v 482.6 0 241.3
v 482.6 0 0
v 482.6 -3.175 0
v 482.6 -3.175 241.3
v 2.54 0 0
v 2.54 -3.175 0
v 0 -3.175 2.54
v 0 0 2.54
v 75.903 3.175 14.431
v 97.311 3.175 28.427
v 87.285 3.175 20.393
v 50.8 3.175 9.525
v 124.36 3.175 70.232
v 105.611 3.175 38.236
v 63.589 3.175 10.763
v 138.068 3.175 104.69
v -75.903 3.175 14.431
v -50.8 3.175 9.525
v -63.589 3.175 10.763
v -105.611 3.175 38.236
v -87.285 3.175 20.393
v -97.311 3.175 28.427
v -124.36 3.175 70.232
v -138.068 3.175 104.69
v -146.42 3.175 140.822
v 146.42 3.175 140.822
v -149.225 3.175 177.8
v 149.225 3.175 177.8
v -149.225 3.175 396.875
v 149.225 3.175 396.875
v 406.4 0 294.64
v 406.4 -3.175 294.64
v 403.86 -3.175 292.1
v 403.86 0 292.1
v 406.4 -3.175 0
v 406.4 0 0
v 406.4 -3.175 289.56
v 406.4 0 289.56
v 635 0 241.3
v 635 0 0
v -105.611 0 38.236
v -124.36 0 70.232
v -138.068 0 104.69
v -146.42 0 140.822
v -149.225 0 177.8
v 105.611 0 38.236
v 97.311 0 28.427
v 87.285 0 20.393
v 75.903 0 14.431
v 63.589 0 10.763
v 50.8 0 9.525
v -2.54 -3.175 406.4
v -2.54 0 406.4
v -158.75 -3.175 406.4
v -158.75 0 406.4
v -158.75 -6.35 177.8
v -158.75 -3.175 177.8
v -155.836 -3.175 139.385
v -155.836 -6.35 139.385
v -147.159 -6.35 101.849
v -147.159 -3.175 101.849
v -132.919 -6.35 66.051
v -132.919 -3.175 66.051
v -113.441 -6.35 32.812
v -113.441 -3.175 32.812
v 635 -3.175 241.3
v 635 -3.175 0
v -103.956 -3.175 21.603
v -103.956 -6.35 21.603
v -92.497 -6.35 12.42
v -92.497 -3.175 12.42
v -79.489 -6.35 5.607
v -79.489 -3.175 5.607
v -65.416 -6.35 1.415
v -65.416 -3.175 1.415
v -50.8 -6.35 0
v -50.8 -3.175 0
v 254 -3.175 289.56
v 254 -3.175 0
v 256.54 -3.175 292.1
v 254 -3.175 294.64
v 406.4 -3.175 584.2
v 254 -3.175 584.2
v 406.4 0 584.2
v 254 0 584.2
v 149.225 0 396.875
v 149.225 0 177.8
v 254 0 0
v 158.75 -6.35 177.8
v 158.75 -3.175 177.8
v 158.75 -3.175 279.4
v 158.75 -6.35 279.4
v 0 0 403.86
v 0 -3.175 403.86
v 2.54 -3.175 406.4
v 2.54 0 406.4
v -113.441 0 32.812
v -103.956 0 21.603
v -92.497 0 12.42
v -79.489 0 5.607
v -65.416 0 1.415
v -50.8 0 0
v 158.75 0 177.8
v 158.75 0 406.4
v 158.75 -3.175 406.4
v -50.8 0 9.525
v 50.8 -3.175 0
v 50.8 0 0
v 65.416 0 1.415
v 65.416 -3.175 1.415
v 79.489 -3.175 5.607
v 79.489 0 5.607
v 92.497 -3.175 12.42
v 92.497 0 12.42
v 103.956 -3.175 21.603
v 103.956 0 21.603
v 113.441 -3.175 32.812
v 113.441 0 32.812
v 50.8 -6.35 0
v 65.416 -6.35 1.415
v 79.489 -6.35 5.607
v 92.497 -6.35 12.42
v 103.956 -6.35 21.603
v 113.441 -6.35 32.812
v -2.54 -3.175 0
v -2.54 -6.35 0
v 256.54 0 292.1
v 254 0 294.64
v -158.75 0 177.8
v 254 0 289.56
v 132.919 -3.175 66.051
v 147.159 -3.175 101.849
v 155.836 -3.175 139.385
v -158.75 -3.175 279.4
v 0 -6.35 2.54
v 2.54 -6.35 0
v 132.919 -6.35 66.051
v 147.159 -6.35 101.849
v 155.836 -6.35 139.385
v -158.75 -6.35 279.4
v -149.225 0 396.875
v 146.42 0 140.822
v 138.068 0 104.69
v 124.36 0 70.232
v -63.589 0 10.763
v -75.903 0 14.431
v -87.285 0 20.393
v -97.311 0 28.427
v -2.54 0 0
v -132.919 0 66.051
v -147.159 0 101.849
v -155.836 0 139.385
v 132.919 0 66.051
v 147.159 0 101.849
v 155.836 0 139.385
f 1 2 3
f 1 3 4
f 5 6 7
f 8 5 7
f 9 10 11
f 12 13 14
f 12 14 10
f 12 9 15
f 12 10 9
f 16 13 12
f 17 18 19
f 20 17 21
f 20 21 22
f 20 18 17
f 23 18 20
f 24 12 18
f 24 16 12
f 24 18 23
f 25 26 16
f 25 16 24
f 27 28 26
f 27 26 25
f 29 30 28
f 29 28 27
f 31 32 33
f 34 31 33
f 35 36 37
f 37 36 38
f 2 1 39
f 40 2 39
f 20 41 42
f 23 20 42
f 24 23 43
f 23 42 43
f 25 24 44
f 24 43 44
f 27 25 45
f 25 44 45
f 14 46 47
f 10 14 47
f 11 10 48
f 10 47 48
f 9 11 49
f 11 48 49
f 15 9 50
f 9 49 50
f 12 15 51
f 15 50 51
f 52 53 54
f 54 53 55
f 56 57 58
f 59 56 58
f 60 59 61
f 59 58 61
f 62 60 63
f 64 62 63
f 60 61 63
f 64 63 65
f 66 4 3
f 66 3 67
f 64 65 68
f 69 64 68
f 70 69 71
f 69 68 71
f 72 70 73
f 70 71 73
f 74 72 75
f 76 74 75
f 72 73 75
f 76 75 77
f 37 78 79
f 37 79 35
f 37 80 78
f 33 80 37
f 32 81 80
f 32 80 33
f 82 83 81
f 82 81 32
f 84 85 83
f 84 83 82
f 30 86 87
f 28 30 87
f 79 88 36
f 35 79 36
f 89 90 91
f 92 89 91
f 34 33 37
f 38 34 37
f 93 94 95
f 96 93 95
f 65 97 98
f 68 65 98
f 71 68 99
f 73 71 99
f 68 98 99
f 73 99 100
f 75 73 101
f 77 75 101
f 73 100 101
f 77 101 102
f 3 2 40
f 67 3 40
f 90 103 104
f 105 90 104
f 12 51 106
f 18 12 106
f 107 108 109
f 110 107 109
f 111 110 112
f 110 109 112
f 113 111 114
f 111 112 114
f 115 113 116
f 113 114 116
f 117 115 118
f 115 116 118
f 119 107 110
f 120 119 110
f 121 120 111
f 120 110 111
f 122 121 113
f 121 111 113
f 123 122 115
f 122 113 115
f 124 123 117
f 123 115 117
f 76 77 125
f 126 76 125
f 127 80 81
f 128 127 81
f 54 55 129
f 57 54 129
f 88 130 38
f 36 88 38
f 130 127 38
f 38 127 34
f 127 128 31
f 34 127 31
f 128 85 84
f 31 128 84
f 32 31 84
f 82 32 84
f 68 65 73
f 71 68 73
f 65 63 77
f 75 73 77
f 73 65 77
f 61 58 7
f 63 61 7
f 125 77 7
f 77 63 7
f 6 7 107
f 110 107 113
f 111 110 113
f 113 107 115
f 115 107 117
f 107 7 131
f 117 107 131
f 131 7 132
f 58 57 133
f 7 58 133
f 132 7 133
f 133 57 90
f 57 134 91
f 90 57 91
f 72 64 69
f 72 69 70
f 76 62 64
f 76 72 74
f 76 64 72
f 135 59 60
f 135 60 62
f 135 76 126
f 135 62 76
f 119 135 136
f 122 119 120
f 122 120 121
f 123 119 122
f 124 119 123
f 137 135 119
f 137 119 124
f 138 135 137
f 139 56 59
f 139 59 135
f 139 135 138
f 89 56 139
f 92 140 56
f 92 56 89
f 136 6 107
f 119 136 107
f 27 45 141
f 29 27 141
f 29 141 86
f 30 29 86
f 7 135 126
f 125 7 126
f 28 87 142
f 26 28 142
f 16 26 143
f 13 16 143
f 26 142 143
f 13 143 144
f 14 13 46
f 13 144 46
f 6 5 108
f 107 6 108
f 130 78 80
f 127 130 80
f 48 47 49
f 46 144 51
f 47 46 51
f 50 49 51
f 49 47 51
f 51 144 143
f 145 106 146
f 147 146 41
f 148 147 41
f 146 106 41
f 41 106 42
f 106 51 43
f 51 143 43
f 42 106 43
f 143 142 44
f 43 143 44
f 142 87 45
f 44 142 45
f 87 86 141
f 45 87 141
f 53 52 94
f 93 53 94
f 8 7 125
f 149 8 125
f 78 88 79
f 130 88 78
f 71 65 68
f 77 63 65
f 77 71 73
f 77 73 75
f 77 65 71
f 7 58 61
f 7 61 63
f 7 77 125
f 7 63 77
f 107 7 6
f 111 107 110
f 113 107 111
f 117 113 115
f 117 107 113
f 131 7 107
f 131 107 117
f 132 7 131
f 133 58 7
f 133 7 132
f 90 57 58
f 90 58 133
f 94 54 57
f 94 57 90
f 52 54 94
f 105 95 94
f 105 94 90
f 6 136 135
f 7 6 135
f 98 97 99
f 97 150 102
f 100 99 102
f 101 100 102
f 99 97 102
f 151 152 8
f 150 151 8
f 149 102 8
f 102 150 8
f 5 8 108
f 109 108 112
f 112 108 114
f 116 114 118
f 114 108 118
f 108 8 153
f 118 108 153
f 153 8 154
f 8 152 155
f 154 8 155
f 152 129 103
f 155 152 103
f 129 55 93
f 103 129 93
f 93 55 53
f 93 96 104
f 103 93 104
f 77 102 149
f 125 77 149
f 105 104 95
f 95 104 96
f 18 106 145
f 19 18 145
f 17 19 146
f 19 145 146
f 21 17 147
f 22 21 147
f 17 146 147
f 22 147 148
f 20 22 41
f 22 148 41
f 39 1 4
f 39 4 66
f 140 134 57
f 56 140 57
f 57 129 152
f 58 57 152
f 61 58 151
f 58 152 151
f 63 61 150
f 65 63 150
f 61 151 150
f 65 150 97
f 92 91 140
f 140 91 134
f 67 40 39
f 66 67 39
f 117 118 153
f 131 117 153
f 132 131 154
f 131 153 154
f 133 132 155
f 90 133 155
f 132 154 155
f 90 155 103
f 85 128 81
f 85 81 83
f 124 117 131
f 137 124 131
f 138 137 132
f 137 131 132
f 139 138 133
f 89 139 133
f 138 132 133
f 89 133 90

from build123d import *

# Parameters (mm, degrees)
F1_DEPTH = 3.175
F3_DEPTH = 3.175
F5_DEPTH = 3.175
F6_W     = 152.4
F6_H     = 584.2
F6_H_2   = 241.3
F7_DEPTH = 3.175
F9_DEPTH = 25.4


with BuildPart() as f1:
    # F0 (on Front) → F1 (new body)
    with BuildSketch(Plane.XZ):
        with BuildLine():
            Line((158.75, 177.8), (158.75, 406.4))
            Line((158.75, 406.4), (-158.75, 406.4))
            Line((-158.75, 406.4), (-158.75, 177.8))
            ThreePointArc((-158.75, 177.8), (-147.159009, 101.848747), (-113.441281, 32.8121))
            ThreePointArc((-113.441281, 32.8121), (-86.157333, 8.699637), (-50.8, 0))
            Line((-50.8, 0), (0, 0))
            Line((0, 0), (50.8, 0))
            ThreePointArc((50.8, 0), (86.157333, 8.699637), (113.441281, 32.8121))
            ThreePointArc((113.441281, 32.8121), (147.159009, 101.848747), (158.75, 177.8))
        make_face()
    extrude(amount=F1_DEPTH)


with BuildPart() as f3:
    # F2 (on face) → F3 (new body)
    with BuildSketch(Plane.XZ.offset(3.175)):
        with BuildLine():
            Line((-158.75, 279.4), (-158.75, 177.8))
            ThreePointArc((-158.75, 177.8), (-147.159009, 101.848747), (-113.441281, 32.8121))
            ThreePointArc((-113.441281, 32.8121), (-86.157333, 8.699637), (-50.8, 0))
            Line((-50.8, 0), (50.8, 0))
            ThreePointArc((50.8, 0), (86.157333, 8.699637), (113.441281, 32.8121))
            ThreePointArc((113.441281, 32.8121), (147.159009, 101.848747), (158.75, 177.8))
            Line((158.75, 177.8), (158.75, 279.4))
            Line((158.75, 279.4), (-158.75, 279.4))
        make_face()
    extrude(amount=F3_DEPTH)


with BuildPart() as f5:
    # F4 (on face) → F5 (new body)
    with BuildSketch(Plane(origin=(0, 0, 0), x_dir=(-1, 0, 0), z_dir=(0, 1, 0))):
        with BuildLine():
            Line((-50.8, 9.525), (50.8, 9.525))
            ThreePointArc((50.8, 9.525), (81.737666, 17.137182), (105.611121, 38.235587))
            ThreePointArc((105.611121, 38.235587), (138.067587, 104.689816), (149.225, 177.8))
            Line((149.225, 177.8), (149.225, 396.875))
            Line((149.225, 396.875), (-149.225, 396.875))
            Line((-149.225, 396.875), (-149.225, 177.8))
            ThreePointArc((-149.225, 177.8), (-138.067587, 104.689816), (-105.611121, 38.235587))
            ThreePointArc((-105.611121, 38.235587), (-81.737666, 17.137182), (-50.8, 9.525))
        make_face()
    extrude(amount=F5_DEPTH)


with BuildPart() as f7:
    # F6 (on Front) → F7 (new body)
    with BuildSketch(Plane.XZ):
        with Locations((330.2, 292.1)):
            Rectangle(F6_W, F6_H)
        with Locations((558.8, 120.65)):
            Rectangle(F6_W, F6_H_2)
    extrude(amount=F7_DEPTH)


with BuildPart() as f9_tool:
    # F8 (on face) → F9 (new body)
    with BuildSketch(Plane.XZ.offset(6.35)):
        Polygon((0, 2.54), (-2.54, 0), (2.54, 0), align=None)
        Polygon((406.4, 289.56), (406.4, 294.64), (403.86, 292.1), align=None)
        Polygon((256.54, 292.1), (254, 294.64), (254, 289.56), align=None)
        Polygon((2.54, 406.4), (-2.54, 406.4), (0, 403.86), align=None)
    extrude(amount=-F9_DEPTH)


with BuildPart() as f1_1:
    add(f1.part)

    # F9: cut by f9_tool
    add(f9_tool.part, mode=Mode.SUBTRACT)


with BuildPart() as f3_1:
    add(f3.part)

    # F9: cut by f9_tool
    add(f9_tool.part, mode=Mode.SUBTRACT)


with BuildPart() as f7_1:
    add(f7.part)

    # F9: cut by f9_tool
    add(f9_tool.part, mode=Mode.SUBTRACT)


solid = Compound([f5.part, f1_1.part, f3_1.part, f7_1.part])
